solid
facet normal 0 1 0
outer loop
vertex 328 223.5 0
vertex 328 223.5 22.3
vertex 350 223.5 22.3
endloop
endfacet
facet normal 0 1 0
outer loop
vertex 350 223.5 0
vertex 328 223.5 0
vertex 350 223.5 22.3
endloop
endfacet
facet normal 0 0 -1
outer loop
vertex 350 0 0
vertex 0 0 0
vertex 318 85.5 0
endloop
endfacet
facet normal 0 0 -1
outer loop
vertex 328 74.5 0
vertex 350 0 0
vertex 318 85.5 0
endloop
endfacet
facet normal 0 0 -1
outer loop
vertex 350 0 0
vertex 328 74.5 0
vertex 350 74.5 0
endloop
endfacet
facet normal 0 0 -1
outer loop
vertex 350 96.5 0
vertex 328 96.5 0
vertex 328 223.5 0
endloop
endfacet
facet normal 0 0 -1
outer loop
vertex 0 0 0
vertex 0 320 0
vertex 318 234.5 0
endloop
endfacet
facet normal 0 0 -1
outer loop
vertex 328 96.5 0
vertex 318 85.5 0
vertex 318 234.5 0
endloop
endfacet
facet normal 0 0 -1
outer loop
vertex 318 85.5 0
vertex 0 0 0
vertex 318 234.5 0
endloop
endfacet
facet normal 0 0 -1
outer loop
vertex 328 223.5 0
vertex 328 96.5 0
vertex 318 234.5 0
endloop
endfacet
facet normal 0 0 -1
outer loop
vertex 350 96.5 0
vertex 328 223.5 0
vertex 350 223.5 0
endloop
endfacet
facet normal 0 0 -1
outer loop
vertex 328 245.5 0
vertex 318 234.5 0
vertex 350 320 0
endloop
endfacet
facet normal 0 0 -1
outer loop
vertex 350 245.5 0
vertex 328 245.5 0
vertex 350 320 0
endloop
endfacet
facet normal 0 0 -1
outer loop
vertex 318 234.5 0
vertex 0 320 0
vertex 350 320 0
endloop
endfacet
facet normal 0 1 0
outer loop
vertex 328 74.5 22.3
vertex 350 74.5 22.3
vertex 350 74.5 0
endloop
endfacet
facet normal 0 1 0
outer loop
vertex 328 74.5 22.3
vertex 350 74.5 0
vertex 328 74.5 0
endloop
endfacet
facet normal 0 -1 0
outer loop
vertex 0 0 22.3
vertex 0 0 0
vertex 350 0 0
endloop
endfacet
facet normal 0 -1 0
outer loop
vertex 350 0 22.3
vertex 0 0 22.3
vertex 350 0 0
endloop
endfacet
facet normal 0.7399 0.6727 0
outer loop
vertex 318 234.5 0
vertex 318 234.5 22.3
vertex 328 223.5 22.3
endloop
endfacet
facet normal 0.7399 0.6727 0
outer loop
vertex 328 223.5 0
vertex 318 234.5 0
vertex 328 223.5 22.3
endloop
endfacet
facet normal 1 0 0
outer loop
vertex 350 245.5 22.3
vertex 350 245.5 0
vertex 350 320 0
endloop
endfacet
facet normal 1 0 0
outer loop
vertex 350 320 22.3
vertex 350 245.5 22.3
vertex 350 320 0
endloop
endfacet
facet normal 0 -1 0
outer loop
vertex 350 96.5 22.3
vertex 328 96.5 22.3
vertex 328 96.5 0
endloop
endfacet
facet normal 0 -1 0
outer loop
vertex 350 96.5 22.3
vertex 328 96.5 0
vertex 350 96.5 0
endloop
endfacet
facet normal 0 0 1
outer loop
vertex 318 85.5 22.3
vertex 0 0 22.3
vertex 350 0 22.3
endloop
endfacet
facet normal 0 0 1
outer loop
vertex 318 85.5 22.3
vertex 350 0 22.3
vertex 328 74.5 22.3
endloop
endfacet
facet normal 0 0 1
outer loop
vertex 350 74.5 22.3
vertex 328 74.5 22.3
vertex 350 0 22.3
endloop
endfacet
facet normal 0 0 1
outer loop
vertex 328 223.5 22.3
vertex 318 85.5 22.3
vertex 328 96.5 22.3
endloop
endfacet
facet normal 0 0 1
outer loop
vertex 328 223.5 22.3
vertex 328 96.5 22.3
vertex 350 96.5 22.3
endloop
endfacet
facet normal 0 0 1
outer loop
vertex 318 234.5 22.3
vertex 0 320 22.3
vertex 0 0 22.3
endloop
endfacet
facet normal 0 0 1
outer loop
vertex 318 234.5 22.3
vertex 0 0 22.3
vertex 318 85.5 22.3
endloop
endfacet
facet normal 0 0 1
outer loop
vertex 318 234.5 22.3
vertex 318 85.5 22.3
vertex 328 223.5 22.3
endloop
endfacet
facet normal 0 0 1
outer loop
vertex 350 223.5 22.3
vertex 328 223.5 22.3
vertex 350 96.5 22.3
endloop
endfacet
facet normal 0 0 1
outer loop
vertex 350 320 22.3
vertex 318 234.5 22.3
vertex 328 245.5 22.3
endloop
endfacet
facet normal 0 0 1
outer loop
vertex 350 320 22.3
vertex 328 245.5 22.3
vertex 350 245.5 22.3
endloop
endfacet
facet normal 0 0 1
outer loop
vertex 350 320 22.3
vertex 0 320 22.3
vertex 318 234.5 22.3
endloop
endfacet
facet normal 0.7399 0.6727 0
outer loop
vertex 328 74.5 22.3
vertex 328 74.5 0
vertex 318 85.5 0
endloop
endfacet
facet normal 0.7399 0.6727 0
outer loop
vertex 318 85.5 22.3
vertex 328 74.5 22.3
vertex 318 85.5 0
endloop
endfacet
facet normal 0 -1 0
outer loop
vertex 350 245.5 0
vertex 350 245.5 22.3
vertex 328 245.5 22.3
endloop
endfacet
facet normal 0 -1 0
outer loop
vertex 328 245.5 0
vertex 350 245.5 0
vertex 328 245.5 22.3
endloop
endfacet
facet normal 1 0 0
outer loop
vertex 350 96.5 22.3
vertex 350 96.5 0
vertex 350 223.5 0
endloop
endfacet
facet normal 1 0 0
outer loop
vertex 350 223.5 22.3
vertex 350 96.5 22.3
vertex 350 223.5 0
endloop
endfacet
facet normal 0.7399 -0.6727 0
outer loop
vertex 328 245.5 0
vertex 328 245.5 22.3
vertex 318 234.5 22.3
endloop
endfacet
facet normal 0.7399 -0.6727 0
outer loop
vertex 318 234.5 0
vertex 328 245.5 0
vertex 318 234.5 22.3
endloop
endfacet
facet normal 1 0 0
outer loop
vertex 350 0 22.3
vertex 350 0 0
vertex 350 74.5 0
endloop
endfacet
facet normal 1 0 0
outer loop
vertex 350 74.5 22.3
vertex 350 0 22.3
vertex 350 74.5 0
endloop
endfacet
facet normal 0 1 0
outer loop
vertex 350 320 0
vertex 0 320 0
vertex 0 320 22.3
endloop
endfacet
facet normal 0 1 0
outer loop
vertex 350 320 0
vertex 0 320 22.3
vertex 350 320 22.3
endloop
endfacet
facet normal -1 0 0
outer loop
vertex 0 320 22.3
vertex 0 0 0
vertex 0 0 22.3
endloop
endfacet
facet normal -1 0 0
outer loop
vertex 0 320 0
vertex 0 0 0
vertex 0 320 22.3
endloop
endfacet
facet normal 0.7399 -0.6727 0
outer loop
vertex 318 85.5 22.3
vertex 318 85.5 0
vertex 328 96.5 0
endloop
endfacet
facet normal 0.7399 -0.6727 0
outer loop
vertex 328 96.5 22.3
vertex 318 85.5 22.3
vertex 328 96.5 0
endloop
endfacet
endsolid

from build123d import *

# Parameters (mm, degrees)
ESBO_O1_W                = 350
ESBO_O1_H                = 320
RESSALTO_EXTRUS_O1_DEPTH = 22.3
CORTE_EXTRUS_O1_DEPTH    = 475.760244755


with BuildPart() as part:
    # Esboço1 → Ressalto-extrusão1 (new body)
    with BuildSketch(Plane.XY):
        with Locations((175, 160)):
            Rectangle(ESBO_O1_W, ESBO_O1_H)
    extrude(amount=RESSALTO_EXTRUS_O1_DEPTH)

    # Esboço2 → Corte-extrusão1 (cut, through all)
    with BuildSketch(Plane.XY.offset(22.3)):
        Polygon((318, 234.5), (328, 223.5), (350, 223.5), (350, 245.5), (328, 245.5), align=None)
        Polygon((328, 74.5), (318, 85.5), (328, 96.5), (350, 96.5), (350, 74.5), align=None)
    extrude(amount=-CORTE_EXTRUS_O1_DEPTH, mode=Mode.SUBTRACT)


solid = part.part
